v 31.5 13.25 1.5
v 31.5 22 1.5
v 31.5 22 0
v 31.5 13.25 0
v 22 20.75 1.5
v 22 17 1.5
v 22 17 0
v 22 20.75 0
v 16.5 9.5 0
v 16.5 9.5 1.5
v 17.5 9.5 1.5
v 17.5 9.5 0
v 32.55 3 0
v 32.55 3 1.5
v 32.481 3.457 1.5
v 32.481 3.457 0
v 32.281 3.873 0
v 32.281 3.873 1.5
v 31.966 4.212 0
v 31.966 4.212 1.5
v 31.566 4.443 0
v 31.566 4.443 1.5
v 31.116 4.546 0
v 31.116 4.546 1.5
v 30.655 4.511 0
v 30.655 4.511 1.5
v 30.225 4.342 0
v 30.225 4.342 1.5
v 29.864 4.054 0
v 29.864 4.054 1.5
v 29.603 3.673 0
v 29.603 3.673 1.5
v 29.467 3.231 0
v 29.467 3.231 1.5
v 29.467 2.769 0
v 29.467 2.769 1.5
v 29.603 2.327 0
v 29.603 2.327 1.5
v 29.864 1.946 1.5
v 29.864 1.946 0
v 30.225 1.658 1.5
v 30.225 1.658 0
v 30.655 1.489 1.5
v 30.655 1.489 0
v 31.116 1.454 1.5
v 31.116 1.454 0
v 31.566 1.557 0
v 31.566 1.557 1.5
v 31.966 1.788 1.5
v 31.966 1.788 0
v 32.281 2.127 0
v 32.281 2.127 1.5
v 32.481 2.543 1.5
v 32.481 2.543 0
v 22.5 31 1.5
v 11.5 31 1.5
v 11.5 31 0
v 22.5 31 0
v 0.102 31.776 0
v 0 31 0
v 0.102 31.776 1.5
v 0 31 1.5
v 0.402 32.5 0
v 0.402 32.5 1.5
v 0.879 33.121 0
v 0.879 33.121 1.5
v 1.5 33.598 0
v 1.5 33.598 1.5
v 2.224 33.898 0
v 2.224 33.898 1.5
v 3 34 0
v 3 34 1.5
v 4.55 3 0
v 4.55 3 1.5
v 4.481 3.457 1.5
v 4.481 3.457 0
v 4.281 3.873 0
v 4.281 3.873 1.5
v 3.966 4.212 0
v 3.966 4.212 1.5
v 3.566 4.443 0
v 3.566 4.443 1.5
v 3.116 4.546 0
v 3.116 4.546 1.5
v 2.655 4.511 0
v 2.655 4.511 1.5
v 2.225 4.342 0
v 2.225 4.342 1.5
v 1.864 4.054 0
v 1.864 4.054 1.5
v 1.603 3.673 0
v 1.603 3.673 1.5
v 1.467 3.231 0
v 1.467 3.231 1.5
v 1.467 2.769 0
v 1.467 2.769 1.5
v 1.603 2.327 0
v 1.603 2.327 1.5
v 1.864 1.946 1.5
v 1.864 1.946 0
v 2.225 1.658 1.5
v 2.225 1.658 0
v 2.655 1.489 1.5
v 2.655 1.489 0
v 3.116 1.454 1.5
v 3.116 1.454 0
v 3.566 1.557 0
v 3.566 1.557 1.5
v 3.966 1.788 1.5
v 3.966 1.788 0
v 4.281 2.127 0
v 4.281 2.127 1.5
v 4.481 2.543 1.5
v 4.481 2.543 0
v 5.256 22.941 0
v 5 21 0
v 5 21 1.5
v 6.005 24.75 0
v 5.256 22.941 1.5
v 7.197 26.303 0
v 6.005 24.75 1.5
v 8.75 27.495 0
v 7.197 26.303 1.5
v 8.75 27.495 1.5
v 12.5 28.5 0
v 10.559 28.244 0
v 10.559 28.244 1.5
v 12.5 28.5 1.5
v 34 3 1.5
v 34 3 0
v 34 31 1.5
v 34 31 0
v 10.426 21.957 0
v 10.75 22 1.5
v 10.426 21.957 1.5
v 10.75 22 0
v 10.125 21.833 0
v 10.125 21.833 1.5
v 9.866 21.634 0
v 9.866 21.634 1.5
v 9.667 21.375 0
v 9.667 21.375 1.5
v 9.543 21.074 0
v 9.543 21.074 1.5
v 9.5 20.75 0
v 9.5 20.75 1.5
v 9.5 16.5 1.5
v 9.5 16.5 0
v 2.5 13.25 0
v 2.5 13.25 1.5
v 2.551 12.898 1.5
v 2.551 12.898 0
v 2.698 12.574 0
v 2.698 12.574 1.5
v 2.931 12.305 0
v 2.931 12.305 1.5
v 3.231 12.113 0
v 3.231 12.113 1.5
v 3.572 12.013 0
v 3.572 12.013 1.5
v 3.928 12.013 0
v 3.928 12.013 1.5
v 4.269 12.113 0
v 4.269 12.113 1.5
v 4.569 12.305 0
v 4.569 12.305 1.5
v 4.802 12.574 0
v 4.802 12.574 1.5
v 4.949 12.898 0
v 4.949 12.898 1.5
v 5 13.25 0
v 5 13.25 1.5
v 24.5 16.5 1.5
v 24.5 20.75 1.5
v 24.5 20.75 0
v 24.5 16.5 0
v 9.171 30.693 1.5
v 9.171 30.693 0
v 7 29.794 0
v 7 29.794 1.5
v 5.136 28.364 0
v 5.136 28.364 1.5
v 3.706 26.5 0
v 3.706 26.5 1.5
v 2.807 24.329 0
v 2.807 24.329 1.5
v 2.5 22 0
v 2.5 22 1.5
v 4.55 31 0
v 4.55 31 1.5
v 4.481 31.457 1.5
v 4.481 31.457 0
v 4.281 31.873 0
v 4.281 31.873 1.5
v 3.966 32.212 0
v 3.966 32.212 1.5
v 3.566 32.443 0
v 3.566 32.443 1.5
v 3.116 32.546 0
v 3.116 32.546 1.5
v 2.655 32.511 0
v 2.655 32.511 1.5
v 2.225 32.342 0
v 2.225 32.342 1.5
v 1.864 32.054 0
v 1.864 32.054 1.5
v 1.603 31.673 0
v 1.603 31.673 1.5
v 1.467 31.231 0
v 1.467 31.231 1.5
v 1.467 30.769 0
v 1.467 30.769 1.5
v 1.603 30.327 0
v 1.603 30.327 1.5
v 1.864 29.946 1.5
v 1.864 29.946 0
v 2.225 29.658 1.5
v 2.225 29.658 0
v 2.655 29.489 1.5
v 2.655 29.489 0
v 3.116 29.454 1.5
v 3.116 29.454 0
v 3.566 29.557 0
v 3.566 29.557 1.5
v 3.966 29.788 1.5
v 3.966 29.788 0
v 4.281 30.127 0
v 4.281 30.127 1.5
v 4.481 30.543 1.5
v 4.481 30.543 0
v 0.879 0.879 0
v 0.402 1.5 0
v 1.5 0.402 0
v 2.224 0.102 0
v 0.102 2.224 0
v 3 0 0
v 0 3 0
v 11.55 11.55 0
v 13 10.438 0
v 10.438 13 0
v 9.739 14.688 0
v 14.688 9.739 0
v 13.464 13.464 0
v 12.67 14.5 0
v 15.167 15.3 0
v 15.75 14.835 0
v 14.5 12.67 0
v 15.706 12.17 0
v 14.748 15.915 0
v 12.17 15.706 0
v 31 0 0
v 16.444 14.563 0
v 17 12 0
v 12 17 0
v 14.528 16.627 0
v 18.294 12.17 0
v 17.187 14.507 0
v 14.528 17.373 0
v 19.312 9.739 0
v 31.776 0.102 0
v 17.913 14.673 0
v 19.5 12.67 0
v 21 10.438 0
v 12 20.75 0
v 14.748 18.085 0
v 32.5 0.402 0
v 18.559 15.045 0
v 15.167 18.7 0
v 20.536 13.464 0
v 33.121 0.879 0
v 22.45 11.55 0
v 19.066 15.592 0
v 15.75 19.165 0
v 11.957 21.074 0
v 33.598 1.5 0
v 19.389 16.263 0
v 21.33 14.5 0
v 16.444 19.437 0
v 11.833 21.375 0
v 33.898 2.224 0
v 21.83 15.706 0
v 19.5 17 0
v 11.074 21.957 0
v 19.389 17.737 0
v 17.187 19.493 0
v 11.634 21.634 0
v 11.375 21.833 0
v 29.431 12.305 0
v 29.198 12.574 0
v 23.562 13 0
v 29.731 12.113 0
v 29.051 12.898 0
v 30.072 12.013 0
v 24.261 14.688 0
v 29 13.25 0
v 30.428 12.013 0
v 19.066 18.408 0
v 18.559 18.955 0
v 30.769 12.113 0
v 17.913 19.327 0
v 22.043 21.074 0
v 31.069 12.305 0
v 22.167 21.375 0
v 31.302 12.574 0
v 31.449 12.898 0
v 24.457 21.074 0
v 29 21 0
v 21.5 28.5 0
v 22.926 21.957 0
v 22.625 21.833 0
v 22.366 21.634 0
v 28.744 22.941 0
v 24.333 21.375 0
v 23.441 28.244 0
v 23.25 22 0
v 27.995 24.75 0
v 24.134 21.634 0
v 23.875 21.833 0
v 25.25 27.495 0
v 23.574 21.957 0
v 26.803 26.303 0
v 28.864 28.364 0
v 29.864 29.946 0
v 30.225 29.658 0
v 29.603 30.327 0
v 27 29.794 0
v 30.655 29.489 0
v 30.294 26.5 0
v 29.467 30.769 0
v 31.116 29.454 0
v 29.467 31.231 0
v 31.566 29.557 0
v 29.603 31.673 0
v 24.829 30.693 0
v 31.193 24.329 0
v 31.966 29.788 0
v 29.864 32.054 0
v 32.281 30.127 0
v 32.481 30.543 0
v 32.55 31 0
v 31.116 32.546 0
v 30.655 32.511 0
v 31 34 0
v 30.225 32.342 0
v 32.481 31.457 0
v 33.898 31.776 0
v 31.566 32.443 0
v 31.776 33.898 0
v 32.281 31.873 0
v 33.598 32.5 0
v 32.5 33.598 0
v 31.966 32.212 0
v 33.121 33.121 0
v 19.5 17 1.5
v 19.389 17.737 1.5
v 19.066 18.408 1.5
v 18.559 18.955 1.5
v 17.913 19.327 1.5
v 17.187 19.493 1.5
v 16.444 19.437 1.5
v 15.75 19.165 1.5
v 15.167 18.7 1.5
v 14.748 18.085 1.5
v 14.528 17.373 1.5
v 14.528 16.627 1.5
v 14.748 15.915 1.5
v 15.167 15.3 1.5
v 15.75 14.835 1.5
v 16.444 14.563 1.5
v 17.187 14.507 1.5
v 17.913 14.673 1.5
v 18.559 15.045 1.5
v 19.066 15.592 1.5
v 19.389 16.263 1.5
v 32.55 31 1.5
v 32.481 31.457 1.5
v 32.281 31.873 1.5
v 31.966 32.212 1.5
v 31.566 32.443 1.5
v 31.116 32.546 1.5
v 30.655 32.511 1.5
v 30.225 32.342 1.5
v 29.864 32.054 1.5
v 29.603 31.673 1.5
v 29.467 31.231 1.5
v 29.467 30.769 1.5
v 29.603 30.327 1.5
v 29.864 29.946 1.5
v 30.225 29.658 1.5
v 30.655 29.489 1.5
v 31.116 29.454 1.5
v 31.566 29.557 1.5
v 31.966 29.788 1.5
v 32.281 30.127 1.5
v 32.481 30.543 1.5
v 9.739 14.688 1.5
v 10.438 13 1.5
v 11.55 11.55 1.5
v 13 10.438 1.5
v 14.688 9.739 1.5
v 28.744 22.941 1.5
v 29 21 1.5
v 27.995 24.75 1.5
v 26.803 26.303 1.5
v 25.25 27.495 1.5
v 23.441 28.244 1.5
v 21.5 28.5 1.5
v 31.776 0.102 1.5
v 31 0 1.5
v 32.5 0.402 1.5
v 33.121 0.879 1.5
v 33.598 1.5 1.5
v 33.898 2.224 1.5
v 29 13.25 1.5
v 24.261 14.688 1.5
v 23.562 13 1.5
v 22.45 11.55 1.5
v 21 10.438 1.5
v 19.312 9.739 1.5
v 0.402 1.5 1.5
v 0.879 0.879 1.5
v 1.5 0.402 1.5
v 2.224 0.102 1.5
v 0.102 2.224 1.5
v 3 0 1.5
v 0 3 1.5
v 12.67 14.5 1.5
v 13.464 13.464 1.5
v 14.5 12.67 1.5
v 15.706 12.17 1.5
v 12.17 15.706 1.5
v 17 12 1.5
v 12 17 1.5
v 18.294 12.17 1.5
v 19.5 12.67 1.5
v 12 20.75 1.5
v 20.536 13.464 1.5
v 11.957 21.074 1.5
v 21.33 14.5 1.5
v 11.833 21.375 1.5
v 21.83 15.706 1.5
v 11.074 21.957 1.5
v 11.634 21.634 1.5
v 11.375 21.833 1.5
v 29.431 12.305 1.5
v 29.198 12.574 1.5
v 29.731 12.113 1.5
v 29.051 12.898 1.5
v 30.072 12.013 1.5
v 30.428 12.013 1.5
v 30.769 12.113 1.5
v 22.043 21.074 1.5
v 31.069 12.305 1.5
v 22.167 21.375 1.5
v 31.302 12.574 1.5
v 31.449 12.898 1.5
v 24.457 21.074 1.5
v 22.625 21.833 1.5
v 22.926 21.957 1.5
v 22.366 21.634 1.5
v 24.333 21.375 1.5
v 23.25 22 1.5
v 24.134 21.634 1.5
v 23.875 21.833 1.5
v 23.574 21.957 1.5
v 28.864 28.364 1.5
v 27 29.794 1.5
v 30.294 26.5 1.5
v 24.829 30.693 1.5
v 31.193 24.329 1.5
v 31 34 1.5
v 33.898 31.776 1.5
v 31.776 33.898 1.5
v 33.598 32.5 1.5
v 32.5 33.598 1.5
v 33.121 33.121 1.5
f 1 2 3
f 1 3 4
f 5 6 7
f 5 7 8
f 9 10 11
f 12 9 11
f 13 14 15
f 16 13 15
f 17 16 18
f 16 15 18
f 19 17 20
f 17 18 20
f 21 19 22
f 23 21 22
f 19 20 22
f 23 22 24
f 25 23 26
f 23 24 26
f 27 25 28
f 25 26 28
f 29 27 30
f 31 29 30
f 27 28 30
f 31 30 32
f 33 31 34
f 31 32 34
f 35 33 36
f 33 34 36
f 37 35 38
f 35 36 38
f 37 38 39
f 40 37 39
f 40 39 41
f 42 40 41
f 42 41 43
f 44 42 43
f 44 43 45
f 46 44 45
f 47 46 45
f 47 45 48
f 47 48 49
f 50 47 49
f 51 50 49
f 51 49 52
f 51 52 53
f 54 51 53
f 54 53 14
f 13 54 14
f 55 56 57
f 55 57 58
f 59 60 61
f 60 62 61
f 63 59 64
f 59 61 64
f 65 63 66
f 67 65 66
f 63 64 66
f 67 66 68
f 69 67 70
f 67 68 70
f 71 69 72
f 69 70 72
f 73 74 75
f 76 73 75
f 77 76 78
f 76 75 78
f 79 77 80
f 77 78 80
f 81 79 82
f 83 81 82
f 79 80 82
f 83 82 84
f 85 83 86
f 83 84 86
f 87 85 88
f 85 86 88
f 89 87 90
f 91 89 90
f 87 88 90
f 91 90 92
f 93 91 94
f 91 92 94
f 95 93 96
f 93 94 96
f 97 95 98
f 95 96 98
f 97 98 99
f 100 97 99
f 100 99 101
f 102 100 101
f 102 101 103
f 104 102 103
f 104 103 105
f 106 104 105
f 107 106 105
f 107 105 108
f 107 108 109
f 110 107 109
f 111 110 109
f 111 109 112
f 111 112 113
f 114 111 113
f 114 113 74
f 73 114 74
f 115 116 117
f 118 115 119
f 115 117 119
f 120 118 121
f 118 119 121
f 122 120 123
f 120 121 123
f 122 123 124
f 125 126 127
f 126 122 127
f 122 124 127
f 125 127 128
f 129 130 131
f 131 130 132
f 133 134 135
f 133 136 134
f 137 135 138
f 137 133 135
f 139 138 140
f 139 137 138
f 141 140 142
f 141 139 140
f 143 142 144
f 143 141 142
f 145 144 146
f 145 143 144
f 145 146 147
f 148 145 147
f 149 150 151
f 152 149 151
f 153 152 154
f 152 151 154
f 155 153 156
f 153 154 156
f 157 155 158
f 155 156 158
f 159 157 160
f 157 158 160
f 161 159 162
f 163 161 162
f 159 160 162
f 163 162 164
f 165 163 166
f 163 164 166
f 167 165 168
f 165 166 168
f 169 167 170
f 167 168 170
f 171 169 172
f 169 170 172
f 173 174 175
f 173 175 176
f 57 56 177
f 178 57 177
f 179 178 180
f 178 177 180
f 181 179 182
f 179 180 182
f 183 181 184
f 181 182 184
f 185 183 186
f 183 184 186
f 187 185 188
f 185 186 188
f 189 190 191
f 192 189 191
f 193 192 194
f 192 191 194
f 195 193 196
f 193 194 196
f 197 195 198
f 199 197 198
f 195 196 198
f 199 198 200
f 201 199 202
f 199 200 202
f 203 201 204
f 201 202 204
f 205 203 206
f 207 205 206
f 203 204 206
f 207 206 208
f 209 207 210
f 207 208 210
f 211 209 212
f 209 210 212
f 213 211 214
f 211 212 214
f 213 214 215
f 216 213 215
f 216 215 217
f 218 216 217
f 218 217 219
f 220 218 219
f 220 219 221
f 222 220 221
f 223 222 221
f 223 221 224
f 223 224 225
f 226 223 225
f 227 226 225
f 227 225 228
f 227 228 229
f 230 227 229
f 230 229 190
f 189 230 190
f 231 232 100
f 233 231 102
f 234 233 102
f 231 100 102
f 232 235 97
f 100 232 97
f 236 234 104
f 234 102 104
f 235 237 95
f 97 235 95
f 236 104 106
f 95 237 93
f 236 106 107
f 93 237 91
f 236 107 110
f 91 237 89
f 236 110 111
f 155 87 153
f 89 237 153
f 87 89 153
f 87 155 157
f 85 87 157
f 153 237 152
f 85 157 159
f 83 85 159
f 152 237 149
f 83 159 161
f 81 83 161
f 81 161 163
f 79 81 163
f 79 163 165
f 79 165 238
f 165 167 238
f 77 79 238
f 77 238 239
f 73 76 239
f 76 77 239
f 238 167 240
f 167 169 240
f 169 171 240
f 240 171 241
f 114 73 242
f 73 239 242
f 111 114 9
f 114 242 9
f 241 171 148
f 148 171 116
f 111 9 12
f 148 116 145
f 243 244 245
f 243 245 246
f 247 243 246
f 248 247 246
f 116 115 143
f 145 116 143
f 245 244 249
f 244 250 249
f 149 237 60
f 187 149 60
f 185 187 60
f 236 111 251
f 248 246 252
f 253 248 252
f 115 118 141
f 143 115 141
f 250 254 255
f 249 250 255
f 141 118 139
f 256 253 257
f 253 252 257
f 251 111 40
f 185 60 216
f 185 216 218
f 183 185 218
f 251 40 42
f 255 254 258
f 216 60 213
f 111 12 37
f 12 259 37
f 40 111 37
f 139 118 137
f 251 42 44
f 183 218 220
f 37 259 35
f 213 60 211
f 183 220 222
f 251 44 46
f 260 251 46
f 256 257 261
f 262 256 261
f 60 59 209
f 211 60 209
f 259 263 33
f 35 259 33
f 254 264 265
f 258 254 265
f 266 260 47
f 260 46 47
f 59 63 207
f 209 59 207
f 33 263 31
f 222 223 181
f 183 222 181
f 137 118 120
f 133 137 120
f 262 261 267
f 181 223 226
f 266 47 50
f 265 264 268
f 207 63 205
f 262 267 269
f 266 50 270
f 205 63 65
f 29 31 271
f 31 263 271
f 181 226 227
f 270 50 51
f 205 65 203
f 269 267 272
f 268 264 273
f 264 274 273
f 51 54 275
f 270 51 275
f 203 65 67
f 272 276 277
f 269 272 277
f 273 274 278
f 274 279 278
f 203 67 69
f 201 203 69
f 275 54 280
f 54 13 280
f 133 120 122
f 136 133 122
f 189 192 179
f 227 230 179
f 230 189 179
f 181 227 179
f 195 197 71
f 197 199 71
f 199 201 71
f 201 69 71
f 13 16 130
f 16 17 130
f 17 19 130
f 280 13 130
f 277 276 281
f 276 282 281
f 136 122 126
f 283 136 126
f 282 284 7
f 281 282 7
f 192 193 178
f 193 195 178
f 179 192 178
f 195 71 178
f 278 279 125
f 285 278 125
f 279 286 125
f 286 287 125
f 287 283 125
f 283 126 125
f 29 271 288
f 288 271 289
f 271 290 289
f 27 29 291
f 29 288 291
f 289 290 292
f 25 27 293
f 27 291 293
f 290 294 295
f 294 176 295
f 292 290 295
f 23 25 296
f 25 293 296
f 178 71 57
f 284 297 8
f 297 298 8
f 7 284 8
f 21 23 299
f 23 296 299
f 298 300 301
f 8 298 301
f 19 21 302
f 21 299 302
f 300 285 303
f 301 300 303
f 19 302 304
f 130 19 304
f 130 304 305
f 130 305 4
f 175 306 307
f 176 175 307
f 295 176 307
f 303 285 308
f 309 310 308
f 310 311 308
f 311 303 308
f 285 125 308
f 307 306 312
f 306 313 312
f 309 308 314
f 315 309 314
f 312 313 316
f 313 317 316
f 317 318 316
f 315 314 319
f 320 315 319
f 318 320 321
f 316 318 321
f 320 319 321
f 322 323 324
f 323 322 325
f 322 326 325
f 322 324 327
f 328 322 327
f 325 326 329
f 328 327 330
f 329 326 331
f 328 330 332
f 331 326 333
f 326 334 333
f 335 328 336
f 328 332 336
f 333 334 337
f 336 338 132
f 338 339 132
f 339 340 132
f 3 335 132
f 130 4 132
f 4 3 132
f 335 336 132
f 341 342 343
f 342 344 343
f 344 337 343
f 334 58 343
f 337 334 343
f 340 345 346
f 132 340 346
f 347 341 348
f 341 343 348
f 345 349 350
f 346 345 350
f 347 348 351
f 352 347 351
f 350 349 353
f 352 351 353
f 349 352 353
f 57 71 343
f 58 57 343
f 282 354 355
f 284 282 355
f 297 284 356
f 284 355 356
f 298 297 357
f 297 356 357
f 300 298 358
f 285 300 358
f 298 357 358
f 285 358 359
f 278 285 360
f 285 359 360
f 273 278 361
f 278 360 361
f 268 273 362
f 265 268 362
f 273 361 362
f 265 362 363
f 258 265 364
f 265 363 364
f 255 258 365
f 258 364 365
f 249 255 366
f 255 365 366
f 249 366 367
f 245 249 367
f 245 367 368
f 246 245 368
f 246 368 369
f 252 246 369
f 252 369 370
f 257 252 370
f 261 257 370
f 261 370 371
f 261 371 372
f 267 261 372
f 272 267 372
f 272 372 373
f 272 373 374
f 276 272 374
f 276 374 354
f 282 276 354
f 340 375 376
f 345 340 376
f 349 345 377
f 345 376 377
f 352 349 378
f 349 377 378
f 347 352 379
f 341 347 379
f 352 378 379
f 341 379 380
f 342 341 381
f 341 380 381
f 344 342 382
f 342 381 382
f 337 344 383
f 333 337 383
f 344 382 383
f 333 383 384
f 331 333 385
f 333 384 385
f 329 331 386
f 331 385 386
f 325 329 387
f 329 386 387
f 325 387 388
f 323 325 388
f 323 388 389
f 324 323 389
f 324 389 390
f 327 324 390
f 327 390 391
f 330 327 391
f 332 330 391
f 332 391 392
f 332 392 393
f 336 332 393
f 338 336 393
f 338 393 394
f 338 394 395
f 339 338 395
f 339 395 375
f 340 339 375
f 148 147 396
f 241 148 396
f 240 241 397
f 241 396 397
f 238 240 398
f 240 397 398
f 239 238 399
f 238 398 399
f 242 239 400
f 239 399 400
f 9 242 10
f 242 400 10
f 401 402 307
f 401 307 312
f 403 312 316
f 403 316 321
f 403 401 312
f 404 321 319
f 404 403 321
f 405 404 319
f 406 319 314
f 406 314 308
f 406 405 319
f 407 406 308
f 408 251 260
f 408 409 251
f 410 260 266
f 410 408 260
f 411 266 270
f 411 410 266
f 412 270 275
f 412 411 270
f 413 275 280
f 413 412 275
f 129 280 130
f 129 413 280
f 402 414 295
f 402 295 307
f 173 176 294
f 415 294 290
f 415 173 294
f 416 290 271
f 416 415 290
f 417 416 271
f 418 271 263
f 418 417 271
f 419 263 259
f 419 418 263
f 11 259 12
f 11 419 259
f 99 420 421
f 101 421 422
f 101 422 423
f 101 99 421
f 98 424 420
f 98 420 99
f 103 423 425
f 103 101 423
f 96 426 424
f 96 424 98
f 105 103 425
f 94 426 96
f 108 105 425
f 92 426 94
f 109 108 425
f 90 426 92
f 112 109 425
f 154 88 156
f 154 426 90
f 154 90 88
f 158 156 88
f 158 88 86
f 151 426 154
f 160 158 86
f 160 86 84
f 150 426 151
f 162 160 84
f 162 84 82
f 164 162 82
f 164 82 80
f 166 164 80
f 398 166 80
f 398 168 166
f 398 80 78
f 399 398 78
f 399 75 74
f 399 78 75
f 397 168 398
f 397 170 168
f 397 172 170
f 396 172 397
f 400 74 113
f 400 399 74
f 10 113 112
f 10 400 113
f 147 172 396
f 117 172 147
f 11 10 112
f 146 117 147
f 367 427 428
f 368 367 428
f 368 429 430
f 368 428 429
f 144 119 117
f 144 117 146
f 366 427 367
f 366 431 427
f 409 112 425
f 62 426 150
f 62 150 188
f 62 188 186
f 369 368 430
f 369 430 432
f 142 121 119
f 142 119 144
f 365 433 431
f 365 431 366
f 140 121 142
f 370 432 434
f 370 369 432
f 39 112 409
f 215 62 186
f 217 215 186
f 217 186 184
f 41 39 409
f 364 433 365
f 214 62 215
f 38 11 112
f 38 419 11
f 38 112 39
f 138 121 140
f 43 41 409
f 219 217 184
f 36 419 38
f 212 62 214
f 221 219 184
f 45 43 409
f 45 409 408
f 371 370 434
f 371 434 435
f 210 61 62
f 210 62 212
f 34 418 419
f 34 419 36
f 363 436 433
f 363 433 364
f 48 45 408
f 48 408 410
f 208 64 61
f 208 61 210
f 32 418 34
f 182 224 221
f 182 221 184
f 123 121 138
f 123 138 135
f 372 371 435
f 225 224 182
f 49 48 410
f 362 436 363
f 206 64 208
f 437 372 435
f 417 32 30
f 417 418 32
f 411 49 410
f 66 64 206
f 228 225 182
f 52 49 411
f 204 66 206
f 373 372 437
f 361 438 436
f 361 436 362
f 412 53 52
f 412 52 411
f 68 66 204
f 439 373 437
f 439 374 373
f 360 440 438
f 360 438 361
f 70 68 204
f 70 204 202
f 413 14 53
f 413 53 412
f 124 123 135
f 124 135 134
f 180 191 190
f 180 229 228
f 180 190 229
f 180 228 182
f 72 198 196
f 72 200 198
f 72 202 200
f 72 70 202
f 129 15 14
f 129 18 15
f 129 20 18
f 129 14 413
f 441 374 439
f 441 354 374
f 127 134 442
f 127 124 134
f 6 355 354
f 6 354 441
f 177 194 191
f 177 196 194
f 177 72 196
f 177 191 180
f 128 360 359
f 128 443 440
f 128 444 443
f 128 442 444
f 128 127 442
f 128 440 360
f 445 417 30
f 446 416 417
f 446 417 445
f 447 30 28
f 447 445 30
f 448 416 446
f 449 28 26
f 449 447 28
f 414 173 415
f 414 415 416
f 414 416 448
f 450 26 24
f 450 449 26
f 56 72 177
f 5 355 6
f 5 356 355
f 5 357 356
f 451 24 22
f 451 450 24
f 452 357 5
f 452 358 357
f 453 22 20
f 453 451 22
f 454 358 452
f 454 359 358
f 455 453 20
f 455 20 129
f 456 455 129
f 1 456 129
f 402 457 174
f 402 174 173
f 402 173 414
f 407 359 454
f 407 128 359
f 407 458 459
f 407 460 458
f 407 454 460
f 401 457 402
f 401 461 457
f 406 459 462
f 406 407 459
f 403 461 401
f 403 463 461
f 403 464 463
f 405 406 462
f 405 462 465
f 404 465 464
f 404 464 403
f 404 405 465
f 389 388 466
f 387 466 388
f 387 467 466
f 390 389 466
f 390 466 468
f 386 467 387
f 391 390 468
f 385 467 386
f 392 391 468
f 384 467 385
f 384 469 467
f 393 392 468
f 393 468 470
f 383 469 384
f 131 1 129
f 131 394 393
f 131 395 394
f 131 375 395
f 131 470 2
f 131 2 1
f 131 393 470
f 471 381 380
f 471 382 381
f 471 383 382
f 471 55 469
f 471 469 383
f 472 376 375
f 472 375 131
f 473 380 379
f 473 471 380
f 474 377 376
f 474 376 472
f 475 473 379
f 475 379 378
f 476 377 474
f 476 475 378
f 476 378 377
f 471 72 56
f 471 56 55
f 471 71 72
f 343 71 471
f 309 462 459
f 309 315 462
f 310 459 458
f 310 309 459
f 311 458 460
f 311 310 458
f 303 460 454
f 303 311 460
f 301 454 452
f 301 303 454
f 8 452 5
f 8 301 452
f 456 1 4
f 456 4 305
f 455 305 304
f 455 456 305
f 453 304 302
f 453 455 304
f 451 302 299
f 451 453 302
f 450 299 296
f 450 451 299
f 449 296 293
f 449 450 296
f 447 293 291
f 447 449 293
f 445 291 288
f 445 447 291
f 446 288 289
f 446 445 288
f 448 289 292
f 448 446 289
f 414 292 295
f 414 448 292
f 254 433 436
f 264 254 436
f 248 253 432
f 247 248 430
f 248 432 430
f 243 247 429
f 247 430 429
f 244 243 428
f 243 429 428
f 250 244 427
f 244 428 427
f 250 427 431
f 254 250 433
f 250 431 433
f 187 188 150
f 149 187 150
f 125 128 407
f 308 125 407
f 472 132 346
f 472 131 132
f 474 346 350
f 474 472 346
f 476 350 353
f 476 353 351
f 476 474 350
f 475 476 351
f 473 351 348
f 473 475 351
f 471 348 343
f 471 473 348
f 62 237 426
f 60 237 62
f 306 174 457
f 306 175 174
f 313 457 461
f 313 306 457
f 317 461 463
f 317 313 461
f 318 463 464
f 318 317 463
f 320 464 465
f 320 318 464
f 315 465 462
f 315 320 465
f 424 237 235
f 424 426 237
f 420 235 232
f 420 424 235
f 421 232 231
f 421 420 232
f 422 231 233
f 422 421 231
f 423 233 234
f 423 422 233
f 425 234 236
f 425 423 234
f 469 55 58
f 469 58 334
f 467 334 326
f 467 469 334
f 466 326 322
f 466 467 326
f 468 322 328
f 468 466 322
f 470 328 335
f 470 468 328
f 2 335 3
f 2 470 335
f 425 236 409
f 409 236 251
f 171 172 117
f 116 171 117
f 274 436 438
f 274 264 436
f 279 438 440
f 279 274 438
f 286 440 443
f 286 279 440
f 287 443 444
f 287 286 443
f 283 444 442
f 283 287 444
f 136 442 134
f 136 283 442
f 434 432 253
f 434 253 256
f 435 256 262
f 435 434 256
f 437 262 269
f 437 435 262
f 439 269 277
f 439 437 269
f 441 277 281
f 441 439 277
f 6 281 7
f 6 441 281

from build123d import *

# Parameters (mm, degrees)
SKETCH_1_W             = 34
SKETCH_1_H             = 34
EXTRUDE_1_DEPTH        = 1.5
SKETCH_2_R             = 2.5
SKETCH_2_R_2           = 1.55
CUT_EXTRUDE_1_DEPTH    = 49.106652347
SKETCH_3_R             = 1.25
CUT_EXTRUDE_2_DEPTH    = 49.106652347
CUT_EXTRUDE_3_DEPTH    = 49.106652347
FILLET_1_R             = 1.25
FILLET_1_OF_MIRROR_3_R = 1.25
FILLET_2_R             = 3


with BuildPart() as part:
    # ｽｹｯﾁ1 → ﾎﾞｽ - 押し出し1 (new body)
    with BuildSketch(Plane.XY):
        with Locations((17, 17)):
            Rectangle(SKETCH_1_W, SKETCH_1_H)
    extrude(amount=EXTRUDE_1_DEPTH)

    # ｽｹｯﾁ2 → ｶｯﾄ - 押し出し1 (cut, through all)
    with BuildSketch(Plane.XY.offset(1.5)):
        with Locations((17, 17)):
            Circle(SKETCH_2_R)
        with Locations((3, 31)):
            Circle(SKETCH_2_R_2)
        with Locations((31, 31)):
            Circle(SKETCH_2_R_2)
        with Locations((3, 3)):
            Circle(SKETCH_2_R_2)
        with Locations((31, 3)):
            Circle(SKETCH_2_R_2)
    extrude(amount=-CUT_EXTRUDE_1_DEPTH, mode=Mode.SUBTRACT)

    # ｽｹｯﾁ3 → ｶｯﾄ - 押し出し2 (cut, through all)
    with BuildSketch(Plane.XY.offset(1.5)):
        with BuildLine():
            Line((2.5, 22), (2.5, 13.25))
            ThreePointArc((2.5, 13.25), (3.75, 14.5), (5, 13.25))
            Line((5, 13.25), (5, 21))
            ThreePointArc((5, 21), (7.196699141, 26.303300859), (12.5, 28.5))
            Line((12.5, 28.5), (17, 28.5))
            Line((17, 28.5), (17, 31))
            Line((17, 31), (11.5, 31))
            ThreePointArc((11.5, 31), (5.136038969, 28.363961031), (2.5, 22))
        make_face()
        with Locations((3.75, 13.25)):
            Circle(SKETCH_3_R)
    cut_extrude_2 = extrude(amount=-CUT_EXTRUDE_2_DEPTH, mode=Mode.SUBTRACT)

    # ﾐﾗｰ1: ｶｯﾄ - 押し出し2 across plane
    add(cut_extrude_2.mirror(Plane(origin=(17, 0, 0), x_dir=(0, 0, 1), z_dir=(1, 0, 0))), mode=Mode.SUBTRACT)

    # ｽｹｯﾁ4 → ｶｯﾄ - 押し出し3 (cut, through all)
    with BuildSketch(Plane.XY.offset(1.5)):
        with BuildLine():
            ThreePointArc((17, 12), (13.464466094, 13.464466094), (12, 17))
            Line((12, 17), (12, 22))
            Line((12, 22), (9.5, 22))
            Line((9.5, 22), (9.5, 16.5))
            ThreePointArc((9.5, 16.5), (11.550252532, 11.550252532), (16.5, 9.5))
            Line((16.5, 9.5), (17, 9.5))
            Line((17, 9.5), (17, 12))
        make_face()
    cut_extrude_3 = extrude(amount=-CUT_EXTRUDE_3_DEPTH, mode=Mode.SUBTRACT)

    # ﾌｨﾚｯﾄ1
    fillet_1_edges = [part.edges().sort_by_distance(p)[0] for p in [
        (12, 22, 0.75),
        (9.5, 22, 0.75),
    ]]
    fillet(fillet_1_edges, radius=FILLET_1_R - 0.0001)  # a hair under: the kernel refuses the full size

    # ﾐﾗｰ3: ｶｯﾄ - 押し出し3 across plane
    add(cut_extrude_3.mirror(Plane(origin=(17, 0, 0), x_dir=(0, 0, 1), z_dir=(1, 0, 0))), mode=Mode.SUBTRACT)

    # ﾌｨﾚｯﾄ1 of ﾐﾗｰ3
    fillet_1_of_mirror_3_edges = [part.edges().sort_by_distance(p)[0] for p in [
        (22, 22, 0.75),
        (24.5, 22, 0.75),
    ]]
    fillet(fillet_1_of_mirror_3_edges, radius=FILLET_1_OF_MIRROR_3_R - 0.0001)  # a hair under: the kernel refuses the full size

    # ﾌｨﾚｯﾄ2
    fillet_2_edges = [part.edges().sort_by_distance(p)[0] for p in [
        (0, 34, 0.75),
        (34, 34, 0.75),
        (34, 0, 0.75),
        (0, 0, 0.75),
    ]]
    fillet(fillet_2_edges, radius=FILLET_2_R)


solid = part.part
